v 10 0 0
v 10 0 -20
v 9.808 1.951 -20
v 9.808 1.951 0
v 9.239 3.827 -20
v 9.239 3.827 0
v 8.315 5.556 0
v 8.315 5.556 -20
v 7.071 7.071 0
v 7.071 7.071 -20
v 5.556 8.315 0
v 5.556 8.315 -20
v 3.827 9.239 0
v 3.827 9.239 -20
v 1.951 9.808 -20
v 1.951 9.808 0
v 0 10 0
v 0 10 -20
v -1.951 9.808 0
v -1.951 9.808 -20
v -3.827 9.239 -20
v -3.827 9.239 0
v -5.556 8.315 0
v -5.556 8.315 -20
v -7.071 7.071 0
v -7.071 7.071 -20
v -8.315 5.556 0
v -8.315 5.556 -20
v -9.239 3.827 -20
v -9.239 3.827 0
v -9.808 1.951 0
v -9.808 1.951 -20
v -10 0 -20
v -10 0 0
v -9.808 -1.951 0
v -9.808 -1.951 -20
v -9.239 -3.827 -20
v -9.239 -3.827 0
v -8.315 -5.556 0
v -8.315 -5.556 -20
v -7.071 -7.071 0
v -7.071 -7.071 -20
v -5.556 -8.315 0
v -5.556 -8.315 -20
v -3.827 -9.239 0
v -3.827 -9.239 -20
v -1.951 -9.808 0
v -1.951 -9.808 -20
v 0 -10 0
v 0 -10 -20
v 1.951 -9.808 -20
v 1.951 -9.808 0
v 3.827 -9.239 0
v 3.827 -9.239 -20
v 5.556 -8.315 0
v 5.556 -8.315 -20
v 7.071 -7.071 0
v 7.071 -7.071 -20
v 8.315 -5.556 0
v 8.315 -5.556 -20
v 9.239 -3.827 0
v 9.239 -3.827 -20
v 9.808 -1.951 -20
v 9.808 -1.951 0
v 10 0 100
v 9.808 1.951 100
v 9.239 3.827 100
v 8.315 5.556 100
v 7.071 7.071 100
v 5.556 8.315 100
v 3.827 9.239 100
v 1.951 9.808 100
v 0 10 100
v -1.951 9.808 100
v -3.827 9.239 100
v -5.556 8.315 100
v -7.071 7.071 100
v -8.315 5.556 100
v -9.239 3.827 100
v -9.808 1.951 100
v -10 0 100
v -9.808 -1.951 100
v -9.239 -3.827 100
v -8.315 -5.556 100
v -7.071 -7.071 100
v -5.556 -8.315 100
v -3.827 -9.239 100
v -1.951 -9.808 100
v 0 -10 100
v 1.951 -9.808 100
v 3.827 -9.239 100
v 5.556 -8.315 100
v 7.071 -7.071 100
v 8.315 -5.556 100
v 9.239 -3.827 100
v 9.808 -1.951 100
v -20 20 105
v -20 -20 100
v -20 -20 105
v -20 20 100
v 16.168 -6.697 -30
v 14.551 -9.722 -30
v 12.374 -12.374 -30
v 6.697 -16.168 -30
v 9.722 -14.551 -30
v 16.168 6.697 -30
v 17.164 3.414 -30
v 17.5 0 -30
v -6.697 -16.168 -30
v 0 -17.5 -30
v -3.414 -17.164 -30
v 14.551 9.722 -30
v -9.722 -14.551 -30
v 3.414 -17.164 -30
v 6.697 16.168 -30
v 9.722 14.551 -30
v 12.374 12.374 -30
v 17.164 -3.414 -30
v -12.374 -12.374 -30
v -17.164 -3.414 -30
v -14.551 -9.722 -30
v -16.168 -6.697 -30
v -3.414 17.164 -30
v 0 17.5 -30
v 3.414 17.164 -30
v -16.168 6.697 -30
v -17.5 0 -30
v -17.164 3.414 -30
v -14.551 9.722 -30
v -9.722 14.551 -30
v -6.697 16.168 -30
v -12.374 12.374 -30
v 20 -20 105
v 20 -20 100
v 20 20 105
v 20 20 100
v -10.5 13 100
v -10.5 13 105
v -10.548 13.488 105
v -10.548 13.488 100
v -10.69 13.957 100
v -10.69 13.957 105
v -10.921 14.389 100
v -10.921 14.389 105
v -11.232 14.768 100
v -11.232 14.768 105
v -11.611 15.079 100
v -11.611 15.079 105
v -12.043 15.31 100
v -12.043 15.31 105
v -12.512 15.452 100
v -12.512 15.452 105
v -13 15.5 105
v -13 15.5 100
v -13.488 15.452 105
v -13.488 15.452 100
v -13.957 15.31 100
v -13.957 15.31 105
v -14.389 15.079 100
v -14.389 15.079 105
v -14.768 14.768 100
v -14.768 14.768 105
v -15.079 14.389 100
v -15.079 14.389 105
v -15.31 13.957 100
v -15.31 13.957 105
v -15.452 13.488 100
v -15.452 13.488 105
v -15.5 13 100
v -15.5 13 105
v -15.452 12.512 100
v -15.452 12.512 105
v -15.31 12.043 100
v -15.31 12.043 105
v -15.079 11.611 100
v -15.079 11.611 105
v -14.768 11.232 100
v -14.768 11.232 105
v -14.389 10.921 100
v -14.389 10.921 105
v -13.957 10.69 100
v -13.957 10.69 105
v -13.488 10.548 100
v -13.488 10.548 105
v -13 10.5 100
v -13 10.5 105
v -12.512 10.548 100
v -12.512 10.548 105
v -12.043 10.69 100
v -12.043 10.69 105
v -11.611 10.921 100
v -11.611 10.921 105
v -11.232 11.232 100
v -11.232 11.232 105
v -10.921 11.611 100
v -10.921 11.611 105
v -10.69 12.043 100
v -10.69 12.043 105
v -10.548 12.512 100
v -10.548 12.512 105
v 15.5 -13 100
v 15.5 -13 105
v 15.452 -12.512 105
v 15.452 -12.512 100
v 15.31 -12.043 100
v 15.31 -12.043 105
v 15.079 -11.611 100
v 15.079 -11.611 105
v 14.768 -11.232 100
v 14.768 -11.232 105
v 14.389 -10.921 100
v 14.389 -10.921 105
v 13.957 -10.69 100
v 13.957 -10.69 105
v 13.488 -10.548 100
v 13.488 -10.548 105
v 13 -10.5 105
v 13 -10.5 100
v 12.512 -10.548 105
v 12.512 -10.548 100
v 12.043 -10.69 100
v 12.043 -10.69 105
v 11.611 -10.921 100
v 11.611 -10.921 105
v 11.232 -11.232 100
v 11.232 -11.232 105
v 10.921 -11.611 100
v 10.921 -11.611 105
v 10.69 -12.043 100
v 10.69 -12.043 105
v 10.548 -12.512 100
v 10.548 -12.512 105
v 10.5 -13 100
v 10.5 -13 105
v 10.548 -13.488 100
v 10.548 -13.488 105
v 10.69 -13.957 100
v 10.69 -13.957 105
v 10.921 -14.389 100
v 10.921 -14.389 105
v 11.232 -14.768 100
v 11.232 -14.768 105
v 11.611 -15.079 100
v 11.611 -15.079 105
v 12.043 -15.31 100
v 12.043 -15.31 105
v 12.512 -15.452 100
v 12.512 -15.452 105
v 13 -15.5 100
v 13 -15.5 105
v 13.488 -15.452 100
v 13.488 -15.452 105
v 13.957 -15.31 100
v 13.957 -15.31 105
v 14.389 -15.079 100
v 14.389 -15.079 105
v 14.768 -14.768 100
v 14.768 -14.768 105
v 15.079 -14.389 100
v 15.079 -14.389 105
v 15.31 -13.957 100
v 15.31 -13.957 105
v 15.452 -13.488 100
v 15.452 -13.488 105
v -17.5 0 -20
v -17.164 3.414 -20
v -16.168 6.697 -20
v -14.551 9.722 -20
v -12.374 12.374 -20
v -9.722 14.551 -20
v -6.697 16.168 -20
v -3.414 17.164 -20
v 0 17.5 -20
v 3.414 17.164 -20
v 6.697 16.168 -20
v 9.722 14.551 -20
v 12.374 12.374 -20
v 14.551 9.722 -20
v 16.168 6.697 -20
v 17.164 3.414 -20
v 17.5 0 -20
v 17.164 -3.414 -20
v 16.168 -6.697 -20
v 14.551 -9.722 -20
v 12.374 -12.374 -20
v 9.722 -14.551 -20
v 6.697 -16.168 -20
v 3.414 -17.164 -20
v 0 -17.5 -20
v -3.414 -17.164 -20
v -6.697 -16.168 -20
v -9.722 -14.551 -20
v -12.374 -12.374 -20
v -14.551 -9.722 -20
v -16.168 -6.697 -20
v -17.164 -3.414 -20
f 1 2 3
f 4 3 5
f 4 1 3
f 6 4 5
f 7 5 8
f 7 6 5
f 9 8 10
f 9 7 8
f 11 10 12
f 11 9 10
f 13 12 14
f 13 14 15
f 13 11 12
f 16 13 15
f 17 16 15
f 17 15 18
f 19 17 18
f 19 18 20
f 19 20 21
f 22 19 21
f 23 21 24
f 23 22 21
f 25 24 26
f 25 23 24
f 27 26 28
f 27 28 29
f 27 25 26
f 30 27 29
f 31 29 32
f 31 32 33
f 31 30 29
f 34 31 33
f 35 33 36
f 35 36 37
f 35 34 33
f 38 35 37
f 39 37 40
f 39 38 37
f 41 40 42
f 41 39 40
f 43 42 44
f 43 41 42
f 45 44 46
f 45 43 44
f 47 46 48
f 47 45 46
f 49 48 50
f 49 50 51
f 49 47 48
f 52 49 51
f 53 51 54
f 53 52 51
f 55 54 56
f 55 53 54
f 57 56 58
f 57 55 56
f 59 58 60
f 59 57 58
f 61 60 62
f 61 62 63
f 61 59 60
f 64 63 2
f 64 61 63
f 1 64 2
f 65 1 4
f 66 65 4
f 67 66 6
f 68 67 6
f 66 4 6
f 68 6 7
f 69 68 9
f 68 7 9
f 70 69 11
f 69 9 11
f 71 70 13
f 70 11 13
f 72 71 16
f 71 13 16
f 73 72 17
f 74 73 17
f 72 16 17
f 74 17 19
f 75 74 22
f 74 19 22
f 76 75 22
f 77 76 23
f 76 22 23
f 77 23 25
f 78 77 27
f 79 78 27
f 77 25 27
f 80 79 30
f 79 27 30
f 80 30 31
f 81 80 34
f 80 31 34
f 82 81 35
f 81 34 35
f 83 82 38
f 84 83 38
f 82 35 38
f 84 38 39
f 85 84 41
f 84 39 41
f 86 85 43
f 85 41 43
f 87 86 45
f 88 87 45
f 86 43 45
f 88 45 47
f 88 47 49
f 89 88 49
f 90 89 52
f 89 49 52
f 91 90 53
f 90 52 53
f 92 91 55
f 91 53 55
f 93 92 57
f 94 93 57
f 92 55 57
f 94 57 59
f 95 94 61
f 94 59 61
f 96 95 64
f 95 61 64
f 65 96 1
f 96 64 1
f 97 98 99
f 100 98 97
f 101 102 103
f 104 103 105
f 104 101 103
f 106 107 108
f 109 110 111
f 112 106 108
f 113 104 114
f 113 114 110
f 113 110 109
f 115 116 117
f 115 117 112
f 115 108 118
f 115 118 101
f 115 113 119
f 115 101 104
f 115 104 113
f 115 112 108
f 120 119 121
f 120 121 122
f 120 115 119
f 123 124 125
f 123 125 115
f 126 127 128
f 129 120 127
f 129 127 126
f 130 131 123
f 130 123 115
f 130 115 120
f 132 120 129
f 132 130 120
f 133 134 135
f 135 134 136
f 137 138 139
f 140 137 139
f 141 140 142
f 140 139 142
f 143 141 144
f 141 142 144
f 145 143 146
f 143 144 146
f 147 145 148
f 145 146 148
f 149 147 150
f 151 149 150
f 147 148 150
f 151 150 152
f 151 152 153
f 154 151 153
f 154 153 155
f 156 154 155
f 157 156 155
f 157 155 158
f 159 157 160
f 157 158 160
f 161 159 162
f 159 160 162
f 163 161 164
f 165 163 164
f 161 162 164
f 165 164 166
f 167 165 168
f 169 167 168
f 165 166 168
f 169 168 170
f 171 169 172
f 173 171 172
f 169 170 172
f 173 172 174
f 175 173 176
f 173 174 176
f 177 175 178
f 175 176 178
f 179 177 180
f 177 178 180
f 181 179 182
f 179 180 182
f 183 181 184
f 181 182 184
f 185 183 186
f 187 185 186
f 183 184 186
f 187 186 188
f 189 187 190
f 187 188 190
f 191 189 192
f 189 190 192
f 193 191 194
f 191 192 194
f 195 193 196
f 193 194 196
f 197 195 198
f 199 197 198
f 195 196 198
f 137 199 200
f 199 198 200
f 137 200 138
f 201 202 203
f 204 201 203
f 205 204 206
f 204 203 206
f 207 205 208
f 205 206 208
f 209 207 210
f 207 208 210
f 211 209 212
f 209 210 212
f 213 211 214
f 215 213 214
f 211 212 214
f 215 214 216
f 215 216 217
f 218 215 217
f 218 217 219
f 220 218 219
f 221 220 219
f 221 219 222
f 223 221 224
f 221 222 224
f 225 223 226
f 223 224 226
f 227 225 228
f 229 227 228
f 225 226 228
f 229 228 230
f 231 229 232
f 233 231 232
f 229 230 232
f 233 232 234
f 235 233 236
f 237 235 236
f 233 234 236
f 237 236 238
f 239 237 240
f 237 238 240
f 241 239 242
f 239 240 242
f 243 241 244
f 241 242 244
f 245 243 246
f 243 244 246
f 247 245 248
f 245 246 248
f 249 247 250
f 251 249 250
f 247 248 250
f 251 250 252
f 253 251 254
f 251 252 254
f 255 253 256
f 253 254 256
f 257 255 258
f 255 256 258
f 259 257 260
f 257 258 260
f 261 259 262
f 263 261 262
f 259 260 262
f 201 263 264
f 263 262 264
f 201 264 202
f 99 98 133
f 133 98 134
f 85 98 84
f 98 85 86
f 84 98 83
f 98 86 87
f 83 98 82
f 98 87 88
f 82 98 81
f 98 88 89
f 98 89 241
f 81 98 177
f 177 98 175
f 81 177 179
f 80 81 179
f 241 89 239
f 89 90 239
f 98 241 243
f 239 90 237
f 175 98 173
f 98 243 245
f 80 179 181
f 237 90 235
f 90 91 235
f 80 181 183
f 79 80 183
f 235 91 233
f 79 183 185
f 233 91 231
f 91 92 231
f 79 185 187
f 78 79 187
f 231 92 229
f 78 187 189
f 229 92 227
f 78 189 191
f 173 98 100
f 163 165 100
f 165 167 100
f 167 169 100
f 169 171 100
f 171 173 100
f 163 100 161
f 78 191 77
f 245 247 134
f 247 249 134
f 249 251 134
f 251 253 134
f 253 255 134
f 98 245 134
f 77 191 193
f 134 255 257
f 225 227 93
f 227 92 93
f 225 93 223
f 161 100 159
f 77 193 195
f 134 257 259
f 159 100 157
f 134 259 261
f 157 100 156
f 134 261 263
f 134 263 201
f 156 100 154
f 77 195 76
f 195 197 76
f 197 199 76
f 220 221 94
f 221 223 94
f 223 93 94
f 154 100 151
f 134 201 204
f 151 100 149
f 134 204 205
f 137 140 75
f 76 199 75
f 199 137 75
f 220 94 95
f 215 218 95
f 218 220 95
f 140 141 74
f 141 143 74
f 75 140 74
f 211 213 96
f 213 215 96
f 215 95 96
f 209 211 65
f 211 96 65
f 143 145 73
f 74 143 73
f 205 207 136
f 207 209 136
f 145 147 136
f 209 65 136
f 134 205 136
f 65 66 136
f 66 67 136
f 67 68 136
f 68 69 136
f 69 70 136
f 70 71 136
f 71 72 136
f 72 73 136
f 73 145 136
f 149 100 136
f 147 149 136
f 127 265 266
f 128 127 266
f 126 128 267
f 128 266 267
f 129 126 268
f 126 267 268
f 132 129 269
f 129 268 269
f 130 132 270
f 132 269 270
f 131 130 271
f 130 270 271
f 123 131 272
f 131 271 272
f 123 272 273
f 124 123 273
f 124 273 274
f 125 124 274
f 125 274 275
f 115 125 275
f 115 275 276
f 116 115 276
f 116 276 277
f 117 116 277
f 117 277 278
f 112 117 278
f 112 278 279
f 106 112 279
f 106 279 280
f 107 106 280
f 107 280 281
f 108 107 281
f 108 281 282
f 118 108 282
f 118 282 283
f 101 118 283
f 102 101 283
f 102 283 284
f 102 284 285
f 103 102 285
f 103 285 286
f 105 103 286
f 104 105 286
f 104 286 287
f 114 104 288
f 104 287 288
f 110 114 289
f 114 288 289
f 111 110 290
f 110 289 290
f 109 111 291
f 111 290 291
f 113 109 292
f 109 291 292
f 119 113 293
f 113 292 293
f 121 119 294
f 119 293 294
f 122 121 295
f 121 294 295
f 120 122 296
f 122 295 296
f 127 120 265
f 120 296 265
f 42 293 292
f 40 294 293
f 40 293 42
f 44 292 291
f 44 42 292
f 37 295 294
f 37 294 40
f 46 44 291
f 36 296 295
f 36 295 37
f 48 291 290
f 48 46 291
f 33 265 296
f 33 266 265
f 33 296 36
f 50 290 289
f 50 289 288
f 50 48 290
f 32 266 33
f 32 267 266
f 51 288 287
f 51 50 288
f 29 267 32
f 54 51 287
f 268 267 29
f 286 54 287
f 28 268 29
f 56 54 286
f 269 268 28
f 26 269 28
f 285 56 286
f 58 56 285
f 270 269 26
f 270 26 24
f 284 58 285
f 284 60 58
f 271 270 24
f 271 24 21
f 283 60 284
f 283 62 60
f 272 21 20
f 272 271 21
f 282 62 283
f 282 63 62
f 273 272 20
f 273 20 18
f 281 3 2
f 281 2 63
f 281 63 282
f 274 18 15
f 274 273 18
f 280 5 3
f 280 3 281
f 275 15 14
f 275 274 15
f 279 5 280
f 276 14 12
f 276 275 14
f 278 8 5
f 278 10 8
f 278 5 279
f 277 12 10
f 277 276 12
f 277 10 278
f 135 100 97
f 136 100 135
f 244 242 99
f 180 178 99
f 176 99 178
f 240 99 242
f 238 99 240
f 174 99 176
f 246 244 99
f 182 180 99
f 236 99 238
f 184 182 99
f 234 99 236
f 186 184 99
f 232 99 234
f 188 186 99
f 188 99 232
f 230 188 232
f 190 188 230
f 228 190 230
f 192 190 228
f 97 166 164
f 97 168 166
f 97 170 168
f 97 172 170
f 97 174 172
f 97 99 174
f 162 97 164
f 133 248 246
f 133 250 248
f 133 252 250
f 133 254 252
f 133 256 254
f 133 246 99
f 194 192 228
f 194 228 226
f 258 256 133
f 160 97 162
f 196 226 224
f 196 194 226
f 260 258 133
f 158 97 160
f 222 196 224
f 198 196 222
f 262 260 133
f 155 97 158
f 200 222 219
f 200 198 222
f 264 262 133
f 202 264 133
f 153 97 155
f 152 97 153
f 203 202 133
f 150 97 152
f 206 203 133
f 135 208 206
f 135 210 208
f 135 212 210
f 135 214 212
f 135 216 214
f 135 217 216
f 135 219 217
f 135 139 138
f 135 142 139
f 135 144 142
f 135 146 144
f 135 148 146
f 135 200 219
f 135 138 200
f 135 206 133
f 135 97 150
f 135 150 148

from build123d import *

# Parameters (mm, degrees)
ESQUISSE1_R             = 10
BOSS_EXTRU_1_DEPTH      = 100
ESQUISSE2_R             = 17.5
BOSS_EXTRU_2_DEPTH      = 30
ESQUISSE3_W             = 40
ESQUISSE3_H             = 40
BOSS_EXTRU_3_DEPTH      = 5
ESQUISSE4_R             = 2.5
ENL_V_MAT_EXTRU_1_DEPTH = 5
ESQUISSE5_OUTSIDE_W     = 71.274
ESQUISSE5_OUTSIDE_H     = 71.274
ESQUISSE5_OUTSIDE_R     = 10
ENL_V_MAT_EXTRU_3_DEPTH = 20


with BuildPart() as part:
    # Esquisse1 → Boss.-Extru.1 (new body)
    with BuildSketch(Plane.XY):
        Circle(ESQUISSE1_R)
    extrude(amount=BOSS_EXTRU_1_DEPTH)

    # Esquisse2 → Boss.-Extru.2 (add)
    with BuildSketch(Plane(origin=(0, 0, 0), x_dir=(-1, 0, 0), z_dir=(0, 0, -1))):
        Circle(ESQUISSE2_R)
    extrude(amount=BOSS_EXTRU_2_DEPTH)

    # Esquisse3 → Boss.-Extru.3 (add)
    with BuildSketch(Plane.XY.offset(100)):
        Rectangle(ESQUISSE3_W, ESQUISSE3_H)
    extrude(amount=BOSS_EXTRU_3_DEPTH)

    # Esquisse4 → Enlèv. mat.-Extru.1 (cut)
    with BuildSketch(Plane.XY.offset(105)):
        with Locations((-13, 13)):
            Circle(ESQUISSE4_R)
        with Locations((13, -13)):
            Circle(ESQUISSE4_R)
    extrude(amount=-ENL_V_MAT_EXTRU_1_DEPTH, mode=Mode.SUBTRACT)

    # Esquisse5 outside → Enlèv. mat.-Extru.3 (cut)
    with BuildSketch(Plane.XY):
        Rectangle(ESQUISSE5_OUTSIDE_W, ESQUISSE5_OUTSIDE_H)
        Circle(ESQUISSE5_OUTSIDE_R, mode=Mode.SUBTRACT)
    extrude(amount=-ENL_V_MAT_EXTRU_3_DEPTH, mode=Mode.SUBTRACT)


solid = part.part
